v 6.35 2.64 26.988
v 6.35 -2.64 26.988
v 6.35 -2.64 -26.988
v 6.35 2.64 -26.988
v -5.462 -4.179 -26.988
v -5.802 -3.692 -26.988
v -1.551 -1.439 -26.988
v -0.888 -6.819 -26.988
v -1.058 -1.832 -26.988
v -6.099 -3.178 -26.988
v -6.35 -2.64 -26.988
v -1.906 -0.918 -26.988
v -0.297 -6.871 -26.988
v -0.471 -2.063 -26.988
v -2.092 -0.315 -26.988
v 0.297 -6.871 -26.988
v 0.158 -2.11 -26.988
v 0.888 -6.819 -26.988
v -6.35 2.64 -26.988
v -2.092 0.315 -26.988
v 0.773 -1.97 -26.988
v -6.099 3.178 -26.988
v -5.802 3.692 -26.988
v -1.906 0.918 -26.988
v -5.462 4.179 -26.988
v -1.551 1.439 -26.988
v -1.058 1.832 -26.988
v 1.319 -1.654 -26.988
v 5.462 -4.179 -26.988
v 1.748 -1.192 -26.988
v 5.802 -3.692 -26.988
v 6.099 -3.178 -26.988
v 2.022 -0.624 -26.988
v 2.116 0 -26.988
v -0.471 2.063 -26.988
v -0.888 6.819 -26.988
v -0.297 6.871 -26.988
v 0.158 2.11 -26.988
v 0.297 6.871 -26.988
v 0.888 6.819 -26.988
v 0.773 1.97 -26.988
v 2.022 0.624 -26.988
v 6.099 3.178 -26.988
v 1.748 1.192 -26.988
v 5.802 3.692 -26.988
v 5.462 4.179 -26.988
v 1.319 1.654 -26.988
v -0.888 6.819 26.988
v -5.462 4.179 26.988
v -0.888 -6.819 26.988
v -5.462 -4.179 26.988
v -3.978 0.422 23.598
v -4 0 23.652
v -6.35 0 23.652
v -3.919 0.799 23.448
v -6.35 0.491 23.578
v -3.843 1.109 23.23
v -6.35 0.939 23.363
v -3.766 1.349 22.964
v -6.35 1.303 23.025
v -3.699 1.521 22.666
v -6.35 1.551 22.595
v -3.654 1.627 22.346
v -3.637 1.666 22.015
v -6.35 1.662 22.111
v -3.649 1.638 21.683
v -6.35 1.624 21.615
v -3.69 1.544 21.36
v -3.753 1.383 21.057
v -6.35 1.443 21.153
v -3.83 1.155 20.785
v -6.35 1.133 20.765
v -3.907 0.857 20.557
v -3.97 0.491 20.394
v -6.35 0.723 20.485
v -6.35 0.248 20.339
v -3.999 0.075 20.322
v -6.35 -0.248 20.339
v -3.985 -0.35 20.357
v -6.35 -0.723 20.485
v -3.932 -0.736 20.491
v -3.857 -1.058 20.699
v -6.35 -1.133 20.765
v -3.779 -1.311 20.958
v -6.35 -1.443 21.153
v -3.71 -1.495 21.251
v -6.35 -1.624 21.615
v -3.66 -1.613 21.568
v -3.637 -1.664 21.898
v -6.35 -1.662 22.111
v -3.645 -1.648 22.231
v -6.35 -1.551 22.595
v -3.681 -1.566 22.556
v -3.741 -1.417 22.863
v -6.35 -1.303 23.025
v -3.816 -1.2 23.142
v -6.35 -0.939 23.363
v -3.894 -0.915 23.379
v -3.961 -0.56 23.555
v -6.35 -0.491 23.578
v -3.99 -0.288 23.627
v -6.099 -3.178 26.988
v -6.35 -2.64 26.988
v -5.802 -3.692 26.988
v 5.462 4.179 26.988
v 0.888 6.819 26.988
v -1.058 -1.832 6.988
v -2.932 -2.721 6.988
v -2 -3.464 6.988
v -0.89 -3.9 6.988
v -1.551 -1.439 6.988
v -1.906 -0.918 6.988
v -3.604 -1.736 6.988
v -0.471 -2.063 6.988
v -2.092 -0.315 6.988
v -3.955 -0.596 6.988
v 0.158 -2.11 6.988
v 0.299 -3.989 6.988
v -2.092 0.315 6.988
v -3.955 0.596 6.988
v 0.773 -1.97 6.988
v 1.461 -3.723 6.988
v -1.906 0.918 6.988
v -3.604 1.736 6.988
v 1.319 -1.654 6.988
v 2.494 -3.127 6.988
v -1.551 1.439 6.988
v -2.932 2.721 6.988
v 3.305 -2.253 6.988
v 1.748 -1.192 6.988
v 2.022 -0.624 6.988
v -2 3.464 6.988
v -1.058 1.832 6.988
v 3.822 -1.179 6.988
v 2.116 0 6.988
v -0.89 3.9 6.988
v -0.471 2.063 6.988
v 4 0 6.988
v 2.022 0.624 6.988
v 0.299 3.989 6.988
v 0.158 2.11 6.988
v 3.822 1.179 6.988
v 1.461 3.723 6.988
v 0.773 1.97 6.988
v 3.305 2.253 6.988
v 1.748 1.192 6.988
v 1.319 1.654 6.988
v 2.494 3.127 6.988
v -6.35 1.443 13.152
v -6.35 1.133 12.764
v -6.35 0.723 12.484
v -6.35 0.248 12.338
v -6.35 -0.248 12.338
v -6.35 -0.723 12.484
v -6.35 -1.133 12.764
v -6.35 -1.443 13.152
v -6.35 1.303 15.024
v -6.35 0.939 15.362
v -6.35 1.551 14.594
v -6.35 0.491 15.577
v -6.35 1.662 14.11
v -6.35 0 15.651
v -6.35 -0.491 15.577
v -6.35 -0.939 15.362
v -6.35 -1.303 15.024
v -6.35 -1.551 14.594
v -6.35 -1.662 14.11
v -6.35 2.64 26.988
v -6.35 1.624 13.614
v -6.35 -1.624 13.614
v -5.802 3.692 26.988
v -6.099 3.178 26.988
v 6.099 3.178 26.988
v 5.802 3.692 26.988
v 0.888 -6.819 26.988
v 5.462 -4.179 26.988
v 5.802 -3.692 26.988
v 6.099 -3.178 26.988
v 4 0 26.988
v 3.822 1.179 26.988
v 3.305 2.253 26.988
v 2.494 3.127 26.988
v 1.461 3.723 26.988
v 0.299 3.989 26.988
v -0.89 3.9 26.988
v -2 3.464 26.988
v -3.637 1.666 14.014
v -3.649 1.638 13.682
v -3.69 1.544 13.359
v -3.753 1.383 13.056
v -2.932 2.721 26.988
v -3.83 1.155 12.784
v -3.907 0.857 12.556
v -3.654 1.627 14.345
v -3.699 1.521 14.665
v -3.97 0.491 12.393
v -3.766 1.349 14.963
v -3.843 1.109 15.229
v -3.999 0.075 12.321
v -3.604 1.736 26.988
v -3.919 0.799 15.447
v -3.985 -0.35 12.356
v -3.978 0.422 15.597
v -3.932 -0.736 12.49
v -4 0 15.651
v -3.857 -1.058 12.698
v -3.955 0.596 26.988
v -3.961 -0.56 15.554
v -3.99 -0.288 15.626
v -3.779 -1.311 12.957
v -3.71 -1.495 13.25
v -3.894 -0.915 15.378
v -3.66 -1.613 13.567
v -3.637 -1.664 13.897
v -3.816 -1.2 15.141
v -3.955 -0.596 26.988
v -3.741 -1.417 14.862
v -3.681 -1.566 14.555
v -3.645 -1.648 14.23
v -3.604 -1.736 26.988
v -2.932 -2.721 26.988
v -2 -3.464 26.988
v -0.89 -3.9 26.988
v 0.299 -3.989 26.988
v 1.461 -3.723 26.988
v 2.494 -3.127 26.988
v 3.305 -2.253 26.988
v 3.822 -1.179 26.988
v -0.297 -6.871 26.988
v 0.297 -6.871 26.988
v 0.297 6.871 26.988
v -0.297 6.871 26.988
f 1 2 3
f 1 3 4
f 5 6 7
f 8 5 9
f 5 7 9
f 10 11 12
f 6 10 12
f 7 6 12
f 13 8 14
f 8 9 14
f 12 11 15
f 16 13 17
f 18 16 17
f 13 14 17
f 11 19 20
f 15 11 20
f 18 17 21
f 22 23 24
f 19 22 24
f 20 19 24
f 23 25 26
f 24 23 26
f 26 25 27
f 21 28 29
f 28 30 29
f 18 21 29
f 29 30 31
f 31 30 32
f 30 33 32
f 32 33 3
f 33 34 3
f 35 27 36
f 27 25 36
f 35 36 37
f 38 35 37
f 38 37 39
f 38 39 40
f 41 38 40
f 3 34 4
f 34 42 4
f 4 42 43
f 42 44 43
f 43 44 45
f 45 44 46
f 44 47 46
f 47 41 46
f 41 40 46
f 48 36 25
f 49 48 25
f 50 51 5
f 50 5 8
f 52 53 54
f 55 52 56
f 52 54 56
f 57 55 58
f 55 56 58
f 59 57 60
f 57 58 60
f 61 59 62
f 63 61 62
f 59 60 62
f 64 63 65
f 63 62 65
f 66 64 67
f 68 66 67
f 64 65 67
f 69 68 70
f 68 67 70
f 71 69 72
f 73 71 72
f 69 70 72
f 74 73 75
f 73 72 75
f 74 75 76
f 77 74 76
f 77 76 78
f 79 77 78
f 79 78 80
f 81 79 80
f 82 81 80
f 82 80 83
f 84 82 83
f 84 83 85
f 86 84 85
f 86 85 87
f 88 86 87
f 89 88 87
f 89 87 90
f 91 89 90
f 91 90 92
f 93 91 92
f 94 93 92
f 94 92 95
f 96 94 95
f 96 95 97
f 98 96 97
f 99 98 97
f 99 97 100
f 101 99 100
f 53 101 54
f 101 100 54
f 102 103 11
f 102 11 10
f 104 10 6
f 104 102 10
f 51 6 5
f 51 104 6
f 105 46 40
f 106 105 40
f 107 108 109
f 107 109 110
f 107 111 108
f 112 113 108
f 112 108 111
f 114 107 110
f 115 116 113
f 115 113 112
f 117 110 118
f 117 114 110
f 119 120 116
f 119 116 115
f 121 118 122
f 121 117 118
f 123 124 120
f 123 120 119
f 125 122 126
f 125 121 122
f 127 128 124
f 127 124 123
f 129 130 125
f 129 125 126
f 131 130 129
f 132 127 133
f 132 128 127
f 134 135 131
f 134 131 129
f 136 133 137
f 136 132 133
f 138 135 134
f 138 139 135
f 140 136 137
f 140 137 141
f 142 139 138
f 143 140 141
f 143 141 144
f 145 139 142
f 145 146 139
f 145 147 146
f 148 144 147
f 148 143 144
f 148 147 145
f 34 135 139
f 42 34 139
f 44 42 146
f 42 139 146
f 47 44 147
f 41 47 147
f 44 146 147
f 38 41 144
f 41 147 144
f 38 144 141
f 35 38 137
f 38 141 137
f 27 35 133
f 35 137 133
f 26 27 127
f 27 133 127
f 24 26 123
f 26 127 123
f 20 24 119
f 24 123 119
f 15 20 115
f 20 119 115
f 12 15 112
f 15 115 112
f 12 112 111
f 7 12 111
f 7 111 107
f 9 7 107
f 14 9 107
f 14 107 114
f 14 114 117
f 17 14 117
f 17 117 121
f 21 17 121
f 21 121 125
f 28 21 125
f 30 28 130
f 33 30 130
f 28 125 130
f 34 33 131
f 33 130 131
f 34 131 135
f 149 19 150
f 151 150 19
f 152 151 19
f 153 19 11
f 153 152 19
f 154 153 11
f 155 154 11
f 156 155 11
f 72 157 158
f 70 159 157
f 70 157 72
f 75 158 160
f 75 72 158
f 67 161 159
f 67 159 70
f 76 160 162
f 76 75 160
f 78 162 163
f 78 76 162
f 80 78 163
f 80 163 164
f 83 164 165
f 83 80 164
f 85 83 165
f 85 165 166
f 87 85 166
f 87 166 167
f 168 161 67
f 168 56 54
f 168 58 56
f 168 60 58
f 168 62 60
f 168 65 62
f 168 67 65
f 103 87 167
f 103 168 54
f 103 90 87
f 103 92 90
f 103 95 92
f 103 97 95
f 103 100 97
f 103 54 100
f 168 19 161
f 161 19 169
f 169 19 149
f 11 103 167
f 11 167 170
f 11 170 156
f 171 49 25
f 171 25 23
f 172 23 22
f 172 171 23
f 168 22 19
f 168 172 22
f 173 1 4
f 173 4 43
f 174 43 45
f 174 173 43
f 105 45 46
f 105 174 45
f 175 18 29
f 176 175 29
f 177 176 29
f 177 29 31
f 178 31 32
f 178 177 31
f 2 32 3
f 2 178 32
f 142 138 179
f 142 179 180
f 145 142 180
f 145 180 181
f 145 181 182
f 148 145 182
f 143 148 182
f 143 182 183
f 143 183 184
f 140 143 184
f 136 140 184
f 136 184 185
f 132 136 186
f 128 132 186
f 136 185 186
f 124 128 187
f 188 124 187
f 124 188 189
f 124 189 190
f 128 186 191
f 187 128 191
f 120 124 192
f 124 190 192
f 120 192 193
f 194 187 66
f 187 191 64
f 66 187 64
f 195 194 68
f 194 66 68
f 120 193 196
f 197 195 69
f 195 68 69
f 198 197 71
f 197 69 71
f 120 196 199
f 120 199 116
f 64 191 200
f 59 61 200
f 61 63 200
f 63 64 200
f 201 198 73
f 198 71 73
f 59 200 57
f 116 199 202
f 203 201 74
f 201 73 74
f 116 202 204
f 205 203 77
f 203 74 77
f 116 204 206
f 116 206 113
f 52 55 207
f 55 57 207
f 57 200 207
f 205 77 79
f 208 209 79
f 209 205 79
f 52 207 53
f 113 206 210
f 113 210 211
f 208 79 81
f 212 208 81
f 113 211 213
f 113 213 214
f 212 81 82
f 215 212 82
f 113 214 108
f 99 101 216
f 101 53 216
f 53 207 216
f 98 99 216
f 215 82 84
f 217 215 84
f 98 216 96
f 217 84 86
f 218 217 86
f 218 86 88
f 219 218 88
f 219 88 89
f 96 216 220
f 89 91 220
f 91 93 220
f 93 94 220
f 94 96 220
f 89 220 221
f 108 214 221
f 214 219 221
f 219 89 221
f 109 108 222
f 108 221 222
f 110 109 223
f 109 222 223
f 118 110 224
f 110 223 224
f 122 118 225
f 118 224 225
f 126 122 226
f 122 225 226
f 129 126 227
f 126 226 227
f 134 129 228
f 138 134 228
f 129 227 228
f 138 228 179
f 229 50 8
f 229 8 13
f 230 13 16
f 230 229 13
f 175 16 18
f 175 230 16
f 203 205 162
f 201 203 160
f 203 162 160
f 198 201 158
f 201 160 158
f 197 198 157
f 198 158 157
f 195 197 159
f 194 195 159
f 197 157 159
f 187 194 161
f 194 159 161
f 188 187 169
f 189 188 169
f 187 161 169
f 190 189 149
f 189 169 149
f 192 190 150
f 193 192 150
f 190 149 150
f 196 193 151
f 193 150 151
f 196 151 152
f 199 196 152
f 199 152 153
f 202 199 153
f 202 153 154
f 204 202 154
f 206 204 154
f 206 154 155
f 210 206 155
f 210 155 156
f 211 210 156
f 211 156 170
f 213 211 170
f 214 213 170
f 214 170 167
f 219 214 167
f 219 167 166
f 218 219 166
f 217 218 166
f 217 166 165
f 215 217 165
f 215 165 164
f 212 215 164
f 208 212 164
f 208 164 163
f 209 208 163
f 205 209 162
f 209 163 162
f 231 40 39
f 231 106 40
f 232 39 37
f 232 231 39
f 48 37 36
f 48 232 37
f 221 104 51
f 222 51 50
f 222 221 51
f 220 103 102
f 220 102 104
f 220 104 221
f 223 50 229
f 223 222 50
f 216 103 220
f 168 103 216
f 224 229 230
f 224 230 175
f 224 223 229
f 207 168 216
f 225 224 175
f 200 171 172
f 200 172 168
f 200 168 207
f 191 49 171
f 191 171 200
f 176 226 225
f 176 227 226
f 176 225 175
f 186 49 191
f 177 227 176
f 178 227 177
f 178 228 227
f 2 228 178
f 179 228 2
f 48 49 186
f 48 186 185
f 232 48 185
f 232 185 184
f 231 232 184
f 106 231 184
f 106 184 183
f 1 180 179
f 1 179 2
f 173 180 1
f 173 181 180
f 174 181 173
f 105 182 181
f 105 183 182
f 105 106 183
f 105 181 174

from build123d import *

# Parameters (mm, degrees)
SKETCH1_R               = 6.35
BASIC_ROD_DEPTH         = 26.9875
BASIC_ROD_DEPTH_BACK    = 26.9875
THEX_DEPTH              = 26.9875
SKETCH2_R               = 2.11582
INTERNAL_CUT_DEPTH      = 27.9875
INTERNAL_CUT_DEPTH_BACK = 27.9875
SKETCH9_R               = 4
CUT_EXTRUDE1_DEPTH      = 19.99996
CUT_EXTRUDE2_REACH      = 14.7
SKETCH10_R              = 1.66624


with BuildPart() as part:
    # Sketch1 → Basic Rod (new body, two sides)
    with BuildSketch(Plane.XY) as basic_rod_sk:
        Circle(SKETCH1_R)
    extrude(amount=BASIC_ROD_DEPTH)
    extrude(basic_rod_sk.sketch, amount=-BASIC_ROD_DEPTH_BACK)

    # Sketch8 → THex (add, symmetric)
    with BuildSketch(Plane.XY):
        with BuildLine():
            Line((-0.888411378, 6.819423871), (-5.461588622, 4.179098758))
            ThreePointArc((-5.461588622, 4.179098758), (-5.955700003, 3.438525), (-6.35, 2.640325113))
            Line((-6.35, 2.640325113), (-6.35, -2.640325113))
            ThreePointArc((-6.35, -2.640325113), (-5.955700003, -3.438525), (-5.461588622, -4.179098758))
            Line((-5.461588622, -4.179098758), (-0.888411378, -6.819423871))
            ThreePointArc((-0.888411378, -6.819423871), (0, -6.87705), (0.888411378, -6.819423871))
            Line((0.888411378, -6.819423871), (5.461588622, -4.179098758))
            ThreePointArc((5.461588622, -4.179098758), (5.955700003, -3.438525), (6.35, -2.640325113))
            Line((6.35, -2.640325113), (6.35, 2.640325113))
            ThreePointArc((6.35, 2.640325113), (5.955700003, 3.438525), (5.461588622, 4.179098758))
            Line((5.461588622, 4.179098758), (0.888411378, 6.819423871))
            ThreePointArc((0.888411378, 6.819423871), (0, 6.87705), (-0.888411378, 6.819423871))
        make_face()
    extrude(amount=THEX_DEPTH, both=True)

    # Sketch2 → Internal Cut (cut, two sides)
    with BuildSketch(Plane.XY) as internal_cut_sk:
        Circle(SKETCH2_R)
    extrude(amount=INTERNAL_CUT_DEPTH, mode=Mode.SUBTRACT)
    extrude(internal_cut_sk.sketch, amount=-INTERNAL_CUT_DEPTH_BACK, mode=Mode.SUBTRACT)

    # Sketch9 → Cut-Extrude1 (cut)
    with BuildSketch(Plane.XY.offset(26.9875)):
        Circle(SKETCH9_R)
    extrude(amount=-CUT_EXTRUDE1_DEPTH, mode=Mode.SUBTRACT)

    # Sketch10 → Cut-Extrude2 (cut, up to next)
    with BuildSketch(Plane.ZY.offset(6.35), mode=Mode.PRIVATE) as cut_extrude2_sk1:
        with Locations((13.98524, 0)):
            Circle(SKETCH10_R)
    cut_extrude2_tool1 = extrude(cut_extrude2_sk1.sketch, amount=-CUT_EXTRUDE2_REACH, mode=Mode.PRIVATE) & part.part
    add(cut_extrude2_tool1.solids().sort_by_distance((-6.35, 0, 13.98524))[0], mode=Mode.SUBTRACT)
    # Sketch10 → Cut-Extrude2 (cut, up to next)
    with BuildSketch(Plane.ZY.offset(6.35), mode=Mode.PRIVATE) as cut_extrude2_sk2:
        with Locations((21.98624, 0)):
            Circle(SKETCH10_R)
    cut_extrude2_tool2 = extrude(cut_extrude2_sk2.sketch, amount=-CUT_EXTRUDE2_REACH, mode=Mode.PRIVATE) & part.part
    add(cut_extrude2_tool2.solids().sort_by_distance((-6.35, 0, 21.98624))[0], mode=Mode.SUBTRACT)


solid = part.part
